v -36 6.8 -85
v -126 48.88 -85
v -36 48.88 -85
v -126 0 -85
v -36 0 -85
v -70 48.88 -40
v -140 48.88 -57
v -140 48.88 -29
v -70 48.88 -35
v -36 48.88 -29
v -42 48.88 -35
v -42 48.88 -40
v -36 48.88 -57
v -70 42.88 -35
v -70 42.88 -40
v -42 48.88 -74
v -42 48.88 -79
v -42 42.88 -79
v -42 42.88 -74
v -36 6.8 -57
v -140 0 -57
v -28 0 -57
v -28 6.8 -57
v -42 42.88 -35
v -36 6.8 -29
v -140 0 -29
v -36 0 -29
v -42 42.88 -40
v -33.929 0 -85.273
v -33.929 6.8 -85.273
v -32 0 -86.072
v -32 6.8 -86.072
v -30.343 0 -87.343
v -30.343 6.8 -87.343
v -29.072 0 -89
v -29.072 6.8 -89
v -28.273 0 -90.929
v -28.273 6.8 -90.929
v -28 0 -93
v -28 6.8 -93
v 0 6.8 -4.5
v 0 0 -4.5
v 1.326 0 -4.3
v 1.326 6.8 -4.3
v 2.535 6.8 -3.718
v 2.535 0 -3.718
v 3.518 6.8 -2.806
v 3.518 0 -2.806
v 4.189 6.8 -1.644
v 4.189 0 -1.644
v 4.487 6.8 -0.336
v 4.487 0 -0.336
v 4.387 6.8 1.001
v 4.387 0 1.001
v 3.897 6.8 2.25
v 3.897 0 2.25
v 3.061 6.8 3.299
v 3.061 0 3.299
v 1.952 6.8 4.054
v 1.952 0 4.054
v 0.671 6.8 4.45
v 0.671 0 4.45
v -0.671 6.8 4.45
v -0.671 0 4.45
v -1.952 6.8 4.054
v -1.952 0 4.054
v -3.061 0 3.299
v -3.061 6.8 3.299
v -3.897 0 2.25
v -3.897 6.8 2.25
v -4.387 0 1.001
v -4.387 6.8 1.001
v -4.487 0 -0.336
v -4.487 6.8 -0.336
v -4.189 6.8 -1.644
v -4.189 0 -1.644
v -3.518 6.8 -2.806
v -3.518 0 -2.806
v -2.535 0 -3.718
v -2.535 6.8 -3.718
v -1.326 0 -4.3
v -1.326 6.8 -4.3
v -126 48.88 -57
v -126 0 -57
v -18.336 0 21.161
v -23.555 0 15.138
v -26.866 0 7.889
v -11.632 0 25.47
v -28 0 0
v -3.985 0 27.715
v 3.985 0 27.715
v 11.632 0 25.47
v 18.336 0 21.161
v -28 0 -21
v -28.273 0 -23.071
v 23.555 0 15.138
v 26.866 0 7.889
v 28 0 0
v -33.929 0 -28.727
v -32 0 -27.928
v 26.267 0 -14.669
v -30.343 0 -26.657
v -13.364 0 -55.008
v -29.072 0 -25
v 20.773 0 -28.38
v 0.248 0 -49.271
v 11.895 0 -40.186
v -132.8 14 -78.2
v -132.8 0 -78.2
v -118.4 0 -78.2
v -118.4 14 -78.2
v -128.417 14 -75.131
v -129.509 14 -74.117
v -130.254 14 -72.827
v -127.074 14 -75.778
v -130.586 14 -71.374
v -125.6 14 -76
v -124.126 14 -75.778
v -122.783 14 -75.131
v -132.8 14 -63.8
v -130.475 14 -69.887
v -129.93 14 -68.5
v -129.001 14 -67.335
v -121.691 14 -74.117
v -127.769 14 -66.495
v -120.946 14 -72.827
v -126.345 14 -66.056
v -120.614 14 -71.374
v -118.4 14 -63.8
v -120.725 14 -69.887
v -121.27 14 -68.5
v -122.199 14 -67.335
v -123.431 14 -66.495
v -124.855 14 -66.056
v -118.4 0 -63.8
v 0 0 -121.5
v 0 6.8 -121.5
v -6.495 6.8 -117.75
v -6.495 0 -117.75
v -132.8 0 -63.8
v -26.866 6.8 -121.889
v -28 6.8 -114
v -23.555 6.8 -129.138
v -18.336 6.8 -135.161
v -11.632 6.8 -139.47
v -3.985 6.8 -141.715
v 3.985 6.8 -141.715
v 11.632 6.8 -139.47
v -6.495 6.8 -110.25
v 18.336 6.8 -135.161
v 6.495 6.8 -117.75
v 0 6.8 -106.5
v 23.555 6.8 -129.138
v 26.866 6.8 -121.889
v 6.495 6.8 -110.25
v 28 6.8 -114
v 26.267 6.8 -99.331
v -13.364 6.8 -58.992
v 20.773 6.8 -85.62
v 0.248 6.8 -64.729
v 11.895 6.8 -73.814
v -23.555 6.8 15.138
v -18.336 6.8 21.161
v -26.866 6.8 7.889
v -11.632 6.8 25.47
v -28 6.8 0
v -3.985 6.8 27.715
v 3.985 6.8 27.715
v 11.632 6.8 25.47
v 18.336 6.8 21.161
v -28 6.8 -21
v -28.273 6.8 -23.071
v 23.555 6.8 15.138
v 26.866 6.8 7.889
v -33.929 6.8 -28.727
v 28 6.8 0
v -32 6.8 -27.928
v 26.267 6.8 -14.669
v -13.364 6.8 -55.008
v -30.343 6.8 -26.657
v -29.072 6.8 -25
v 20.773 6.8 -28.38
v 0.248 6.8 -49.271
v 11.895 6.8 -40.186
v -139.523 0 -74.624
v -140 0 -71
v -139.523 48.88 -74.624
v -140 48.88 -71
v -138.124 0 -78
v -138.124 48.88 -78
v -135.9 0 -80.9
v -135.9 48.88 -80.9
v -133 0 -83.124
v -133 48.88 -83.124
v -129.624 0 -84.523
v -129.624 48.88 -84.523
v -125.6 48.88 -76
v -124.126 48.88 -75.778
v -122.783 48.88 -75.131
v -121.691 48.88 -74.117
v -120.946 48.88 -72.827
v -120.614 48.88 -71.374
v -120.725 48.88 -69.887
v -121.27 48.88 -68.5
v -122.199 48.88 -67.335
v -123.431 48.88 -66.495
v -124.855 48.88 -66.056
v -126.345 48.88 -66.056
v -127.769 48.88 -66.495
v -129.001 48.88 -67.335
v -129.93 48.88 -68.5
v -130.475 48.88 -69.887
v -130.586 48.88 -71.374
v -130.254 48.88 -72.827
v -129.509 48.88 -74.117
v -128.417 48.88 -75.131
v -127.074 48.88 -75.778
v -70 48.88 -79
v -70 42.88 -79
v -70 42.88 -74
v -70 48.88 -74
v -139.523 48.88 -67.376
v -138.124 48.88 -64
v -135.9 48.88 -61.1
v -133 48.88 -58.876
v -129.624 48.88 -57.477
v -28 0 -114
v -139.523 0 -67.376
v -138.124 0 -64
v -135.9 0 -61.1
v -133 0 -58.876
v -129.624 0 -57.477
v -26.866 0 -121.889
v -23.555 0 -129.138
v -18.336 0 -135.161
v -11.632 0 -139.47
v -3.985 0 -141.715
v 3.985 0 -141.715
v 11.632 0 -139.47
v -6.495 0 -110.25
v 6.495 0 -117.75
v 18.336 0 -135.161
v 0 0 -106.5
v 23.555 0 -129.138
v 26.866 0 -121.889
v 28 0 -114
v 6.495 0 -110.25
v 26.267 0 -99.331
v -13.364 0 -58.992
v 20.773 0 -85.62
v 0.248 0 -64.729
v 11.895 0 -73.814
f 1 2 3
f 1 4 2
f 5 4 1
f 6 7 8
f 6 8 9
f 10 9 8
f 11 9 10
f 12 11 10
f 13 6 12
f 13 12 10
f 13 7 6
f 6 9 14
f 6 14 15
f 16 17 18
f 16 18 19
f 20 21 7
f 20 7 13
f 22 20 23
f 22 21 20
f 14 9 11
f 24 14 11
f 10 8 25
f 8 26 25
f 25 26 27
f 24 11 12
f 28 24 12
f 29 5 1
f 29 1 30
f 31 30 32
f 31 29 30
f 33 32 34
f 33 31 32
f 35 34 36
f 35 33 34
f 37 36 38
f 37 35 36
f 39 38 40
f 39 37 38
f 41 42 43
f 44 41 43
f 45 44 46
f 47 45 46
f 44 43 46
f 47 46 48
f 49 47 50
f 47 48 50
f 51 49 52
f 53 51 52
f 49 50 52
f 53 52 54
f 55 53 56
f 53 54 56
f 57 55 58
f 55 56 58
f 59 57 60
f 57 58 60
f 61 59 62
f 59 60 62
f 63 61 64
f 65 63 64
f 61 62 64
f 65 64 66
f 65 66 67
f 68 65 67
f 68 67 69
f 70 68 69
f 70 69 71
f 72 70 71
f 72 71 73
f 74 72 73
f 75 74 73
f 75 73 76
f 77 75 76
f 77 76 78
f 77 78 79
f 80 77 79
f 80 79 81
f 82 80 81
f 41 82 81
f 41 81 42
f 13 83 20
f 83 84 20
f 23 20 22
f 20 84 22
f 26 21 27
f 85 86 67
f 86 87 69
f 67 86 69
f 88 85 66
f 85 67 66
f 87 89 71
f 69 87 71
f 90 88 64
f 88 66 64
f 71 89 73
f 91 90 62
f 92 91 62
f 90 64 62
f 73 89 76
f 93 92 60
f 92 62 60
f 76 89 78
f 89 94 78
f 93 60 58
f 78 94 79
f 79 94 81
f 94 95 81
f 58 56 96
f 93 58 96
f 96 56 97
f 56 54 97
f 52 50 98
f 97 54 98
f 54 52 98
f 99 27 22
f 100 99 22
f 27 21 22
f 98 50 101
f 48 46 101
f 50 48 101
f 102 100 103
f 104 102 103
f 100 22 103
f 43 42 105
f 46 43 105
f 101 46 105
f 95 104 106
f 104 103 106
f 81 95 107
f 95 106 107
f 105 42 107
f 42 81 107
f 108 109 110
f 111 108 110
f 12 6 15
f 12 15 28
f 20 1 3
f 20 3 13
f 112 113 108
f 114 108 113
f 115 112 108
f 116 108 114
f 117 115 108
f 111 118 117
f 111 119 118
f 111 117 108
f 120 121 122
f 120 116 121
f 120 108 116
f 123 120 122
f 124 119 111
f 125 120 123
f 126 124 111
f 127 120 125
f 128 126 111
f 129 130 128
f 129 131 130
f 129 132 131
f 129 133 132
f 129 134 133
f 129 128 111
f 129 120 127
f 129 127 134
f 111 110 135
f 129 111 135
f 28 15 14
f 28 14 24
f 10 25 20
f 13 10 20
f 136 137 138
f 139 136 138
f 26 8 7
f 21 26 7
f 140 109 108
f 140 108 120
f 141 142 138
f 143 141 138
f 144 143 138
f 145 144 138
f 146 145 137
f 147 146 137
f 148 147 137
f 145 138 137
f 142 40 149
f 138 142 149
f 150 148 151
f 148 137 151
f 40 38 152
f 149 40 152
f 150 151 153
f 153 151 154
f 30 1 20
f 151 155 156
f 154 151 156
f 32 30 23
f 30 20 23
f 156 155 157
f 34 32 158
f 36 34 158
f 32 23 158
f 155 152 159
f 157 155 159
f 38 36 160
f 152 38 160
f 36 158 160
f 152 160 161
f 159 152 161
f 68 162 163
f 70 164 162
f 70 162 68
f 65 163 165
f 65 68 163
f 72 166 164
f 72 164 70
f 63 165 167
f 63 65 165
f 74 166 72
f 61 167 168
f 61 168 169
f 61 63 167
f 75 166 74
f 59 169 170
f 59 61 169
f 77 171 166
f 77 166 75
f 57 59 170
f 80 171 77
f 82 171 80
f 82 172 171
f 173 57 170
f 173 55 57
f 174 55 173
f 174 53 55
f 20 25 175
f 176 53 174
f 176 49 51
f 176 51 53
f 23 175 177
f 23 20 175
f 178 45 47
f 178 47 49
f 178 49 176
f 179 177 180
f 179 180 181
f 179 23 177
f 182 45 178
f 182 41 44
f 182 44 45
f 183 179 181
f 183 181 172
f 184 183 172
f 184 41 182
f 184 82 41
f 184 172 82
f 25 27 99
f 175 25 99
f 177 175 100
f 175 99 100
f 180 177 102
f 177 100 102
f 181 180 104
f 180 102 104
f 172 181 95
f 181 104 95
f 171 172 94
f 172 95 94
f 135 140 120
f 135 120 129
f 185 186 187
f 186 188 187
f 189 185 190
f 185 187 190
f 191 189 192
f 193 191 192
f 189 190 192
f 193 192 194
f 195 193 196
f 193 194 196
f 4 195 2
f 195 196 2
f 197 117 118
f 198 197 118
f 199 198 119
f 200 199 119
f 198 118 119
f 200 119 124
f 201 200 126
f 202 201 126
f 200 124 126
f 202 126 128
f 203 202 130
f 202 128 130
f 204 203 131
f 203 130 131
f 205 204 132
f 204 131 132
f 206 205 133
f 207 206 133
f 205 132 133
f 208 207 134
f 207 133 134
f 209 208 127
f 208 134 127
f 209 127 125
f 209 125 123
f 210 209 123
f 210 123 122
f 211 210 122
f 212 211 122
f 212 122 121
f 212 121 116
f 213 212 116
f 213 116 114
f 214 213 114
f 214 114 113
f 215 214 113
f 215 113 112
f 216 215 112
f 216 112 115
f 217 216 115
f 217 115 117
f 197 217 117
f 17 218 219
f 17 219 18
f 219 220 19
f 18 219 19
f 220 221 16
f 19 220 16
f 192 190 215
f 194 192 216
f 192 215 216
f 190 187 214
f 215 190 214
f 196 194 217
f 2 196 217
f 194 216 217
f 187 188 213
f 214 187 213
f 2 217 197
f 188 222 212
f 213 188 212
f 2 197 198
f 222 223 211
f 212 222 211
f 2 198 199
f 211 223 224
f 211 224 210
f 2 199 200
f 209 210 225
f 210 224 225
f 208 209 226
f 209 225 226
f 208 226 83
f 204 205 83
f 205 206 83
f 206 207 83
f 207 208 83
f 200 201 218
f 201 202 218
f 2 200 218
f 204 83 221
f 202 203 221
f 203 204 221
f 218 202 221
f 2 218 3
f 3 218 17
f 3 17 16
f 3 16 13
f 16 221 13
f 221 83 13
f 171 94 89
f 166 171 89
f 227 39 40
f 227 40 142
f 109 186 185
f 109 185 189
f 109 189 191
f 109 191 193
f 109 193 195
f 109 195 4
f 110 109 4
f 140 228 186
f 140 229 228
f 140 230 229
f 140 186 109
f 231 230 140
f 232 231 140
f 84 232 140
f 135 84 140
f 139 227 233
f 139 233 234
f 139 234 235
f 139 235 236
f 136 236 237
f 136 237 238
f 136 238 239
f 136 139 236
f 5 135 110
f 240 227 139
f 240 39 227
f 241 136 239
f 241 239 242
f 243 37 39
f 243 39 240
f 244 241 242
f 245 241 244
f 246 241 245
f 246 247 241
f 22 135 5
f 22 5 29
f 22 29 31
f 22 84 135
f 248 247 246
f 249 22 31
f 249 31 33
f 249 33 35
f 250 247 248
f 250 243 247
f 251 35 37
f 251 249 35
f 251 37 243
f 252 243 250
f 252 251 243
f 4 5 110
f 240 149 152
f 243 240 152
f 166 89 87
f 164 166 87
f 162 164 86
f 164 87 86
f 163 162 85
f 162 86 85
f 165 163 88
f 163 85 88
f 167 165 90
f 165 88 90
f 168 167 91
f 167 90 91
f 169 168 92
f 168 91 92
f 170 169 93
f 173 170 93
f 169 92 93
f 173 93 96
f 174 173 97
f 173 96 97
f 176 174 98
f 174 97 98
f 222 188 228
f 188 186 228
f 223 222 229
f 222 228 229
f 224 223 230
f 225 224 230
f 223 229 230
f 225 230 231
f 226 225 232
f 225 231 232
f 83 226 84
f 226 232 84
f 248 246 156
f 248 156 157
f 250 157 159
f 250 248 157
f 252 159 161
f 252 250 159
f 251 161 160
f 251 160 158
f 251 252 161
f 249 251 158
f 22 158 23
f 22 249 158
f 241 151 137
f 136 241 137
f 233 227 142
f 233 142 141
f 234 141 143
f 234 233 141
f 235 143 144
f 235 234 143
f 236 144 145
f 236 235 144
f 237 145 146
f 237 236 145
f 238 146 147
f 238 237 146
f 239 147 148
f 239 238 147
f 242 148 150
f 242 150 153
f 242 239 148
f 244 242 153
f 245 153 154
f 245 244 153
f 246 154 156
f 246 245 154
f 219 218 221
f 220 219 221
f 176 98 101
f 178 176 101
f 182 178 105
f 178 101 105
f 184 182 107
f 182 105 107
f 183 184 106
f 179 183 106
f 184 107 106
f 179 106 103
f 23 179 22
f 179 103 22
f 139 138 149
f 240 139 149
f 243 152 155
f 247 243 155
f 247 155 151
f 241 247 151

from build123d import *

# Parameters (mm, degrees)
EXTRUDE_1_DEPTH     = 6.8
SKETCH_3_R          = 4.5
CUT_EXTRUDE_1_DEPTH = 152.311731204
SKETCH_5_W          = 104
SKETCH_5_H          = 28
EXTRUDE_3_DEPTH     = 42.08
SKETCH_6_W          = 28
SKETCH_6_H          = 5
CUT_EXTRUDE_3_DEPTH = 6
CUT_EXTRUDE_4_DEPTH = 204.800702648
SKETCH_8_W          = 14.4
SKETCH_8_H          = 14.4
CUT_EXTRUDE_5_DEPTH = 14
SKETCH_9_R          = 5
CUT_EXTRUDE_6_DEPTH = 203.436692326
FILLET_1_R          = 14


with BuildPart() as part:
    # Эскиз1 → Бобышка-Вытянуть1 (new body)
    with BuildSketch(Plane(origin=(0, 0, 0), x_dir=(1, 0, 0), z_dir=(0, 1, 0))):
        with BuildLine():
            ThreePointArc((-28, 0), (0, -28), (28, 0))
            ThreePointArc((28, 0), (11.895099372, 40.186413418), (-28, 57))
            Line((-28, 57), (-140, 57))
            Line((-140, 57), (-140, 29))
            Line((-140, 29), (-36, 29))
            ThreePointArc((-36, 29), (-30.343145751, 26.656854249), (-28, 21))
            Line((-28, 21), (-28, 0))
        make_face()
    extrude(amount=EXTRUDE_1_DEPTH)

    # Эскиз3 → Вырез-Вытянуть1 (cut, through all)
    with BuildSketch(Plane(origin=(0, 0, 0), x_dir=(-1, 0, 0), z_dir=(0, -1, 0))):
        with Locations(Location((0, 0, 0), (0, 0, 90))):
            Circle(SKETCH_3_R)
    extrude(amount=-CUT_EXTRUDE_1_DEPTH, mode=Mode.SUBTRACT)

    # Эскиз5 → Бобышка-Вытянуть3 (add)
    with BuildSketch(Plane(origin=(0, 6.8, 0), x_dir=(1, 0, 0), z_dir=(0, 1, 0))):
        with Locations((-88, 43)):
            Rectangle(SKETCH_5_W, SKETCH_5_H)
    extrude(amount=EXTRUDE_3_DEPTH)

    # Эскиз6 → Вырез-Вытянуть3 (cut)
    with BuildSketch(Plane(origin=(0, 48.88, 0), x_dir=(1, 0, 0), z_dir=(0, 1, 0))):
        with Locations((-56, 37.5)):
            Rectangle(SKETCH_6_W, SKETCH_6_H)
    extrude(amount=-CUT_EXTRUDE_3_DEPTH, mode=Mode.SUBTRACT)


with BuildPart() as body_2:
    # Зеркальное отражение1: mirrored copy
    add(part.part.mirror(Plane(origin=(0, 6.8, -57), x_dir=(1, 0, 0), z_dir=(0, 0, 1))))

    # Эскиз7 → Вырез-Вытянуть4 (cut, through all)
    with BuildSketch(Plane(origin=(0, 6.8, 0), x_dir=(1, 0, 0), z_dir=(0, 1, 0))):
        Polygon((0, 121.5), (-6.495190528, 117.75), (-6.495190528, 110.25), (0, 106.5), (6.495190528, 110.25), (6.495190528, 117.75), align=None)
    extrude(amount=-CUT_EXTRUDE_4_DEPTH, mode=Mode.SUBTRACT)

    # Эскиз8 → Вырез-Вытянуть5 (cut)
    with BuildSketch(Plane.XZ):
        with Locations((-125.6, -71)):
            Rectangle(SKETCH_8_W, SKETCH_8_H)
    extrude(amount=-CUT_EXTRUDE_5_DEPTH, mode=Mode.SUBTRACT)

    # Эскиз9 → Вырез-Вытянуть6 (cut, through all)
    with BuildSketch(Plane.XZ.offset(-14)):
        with Locations(Location((-125.6, -71, 0), (0, 0, 270))):
            Circle(SKETCH_9_R)
    extrude(amount=-CUT_EXTRUDE_6_DEPTH, mode=Mode.SUBTRACT)

    # Скругление1
    fillet_1_edges = [body_2.edges().sort_by_distance(p)[0] for p in [
        (-140, 24.44, -85),
        (-140, 24.44, -57),
    ]]
    fillet(fillet_1_edges, radius=FILLET_1_R - 0.0001)  # a hair under: the kernel refuses the full size


solid = Compound([part.part, body_2.part])
